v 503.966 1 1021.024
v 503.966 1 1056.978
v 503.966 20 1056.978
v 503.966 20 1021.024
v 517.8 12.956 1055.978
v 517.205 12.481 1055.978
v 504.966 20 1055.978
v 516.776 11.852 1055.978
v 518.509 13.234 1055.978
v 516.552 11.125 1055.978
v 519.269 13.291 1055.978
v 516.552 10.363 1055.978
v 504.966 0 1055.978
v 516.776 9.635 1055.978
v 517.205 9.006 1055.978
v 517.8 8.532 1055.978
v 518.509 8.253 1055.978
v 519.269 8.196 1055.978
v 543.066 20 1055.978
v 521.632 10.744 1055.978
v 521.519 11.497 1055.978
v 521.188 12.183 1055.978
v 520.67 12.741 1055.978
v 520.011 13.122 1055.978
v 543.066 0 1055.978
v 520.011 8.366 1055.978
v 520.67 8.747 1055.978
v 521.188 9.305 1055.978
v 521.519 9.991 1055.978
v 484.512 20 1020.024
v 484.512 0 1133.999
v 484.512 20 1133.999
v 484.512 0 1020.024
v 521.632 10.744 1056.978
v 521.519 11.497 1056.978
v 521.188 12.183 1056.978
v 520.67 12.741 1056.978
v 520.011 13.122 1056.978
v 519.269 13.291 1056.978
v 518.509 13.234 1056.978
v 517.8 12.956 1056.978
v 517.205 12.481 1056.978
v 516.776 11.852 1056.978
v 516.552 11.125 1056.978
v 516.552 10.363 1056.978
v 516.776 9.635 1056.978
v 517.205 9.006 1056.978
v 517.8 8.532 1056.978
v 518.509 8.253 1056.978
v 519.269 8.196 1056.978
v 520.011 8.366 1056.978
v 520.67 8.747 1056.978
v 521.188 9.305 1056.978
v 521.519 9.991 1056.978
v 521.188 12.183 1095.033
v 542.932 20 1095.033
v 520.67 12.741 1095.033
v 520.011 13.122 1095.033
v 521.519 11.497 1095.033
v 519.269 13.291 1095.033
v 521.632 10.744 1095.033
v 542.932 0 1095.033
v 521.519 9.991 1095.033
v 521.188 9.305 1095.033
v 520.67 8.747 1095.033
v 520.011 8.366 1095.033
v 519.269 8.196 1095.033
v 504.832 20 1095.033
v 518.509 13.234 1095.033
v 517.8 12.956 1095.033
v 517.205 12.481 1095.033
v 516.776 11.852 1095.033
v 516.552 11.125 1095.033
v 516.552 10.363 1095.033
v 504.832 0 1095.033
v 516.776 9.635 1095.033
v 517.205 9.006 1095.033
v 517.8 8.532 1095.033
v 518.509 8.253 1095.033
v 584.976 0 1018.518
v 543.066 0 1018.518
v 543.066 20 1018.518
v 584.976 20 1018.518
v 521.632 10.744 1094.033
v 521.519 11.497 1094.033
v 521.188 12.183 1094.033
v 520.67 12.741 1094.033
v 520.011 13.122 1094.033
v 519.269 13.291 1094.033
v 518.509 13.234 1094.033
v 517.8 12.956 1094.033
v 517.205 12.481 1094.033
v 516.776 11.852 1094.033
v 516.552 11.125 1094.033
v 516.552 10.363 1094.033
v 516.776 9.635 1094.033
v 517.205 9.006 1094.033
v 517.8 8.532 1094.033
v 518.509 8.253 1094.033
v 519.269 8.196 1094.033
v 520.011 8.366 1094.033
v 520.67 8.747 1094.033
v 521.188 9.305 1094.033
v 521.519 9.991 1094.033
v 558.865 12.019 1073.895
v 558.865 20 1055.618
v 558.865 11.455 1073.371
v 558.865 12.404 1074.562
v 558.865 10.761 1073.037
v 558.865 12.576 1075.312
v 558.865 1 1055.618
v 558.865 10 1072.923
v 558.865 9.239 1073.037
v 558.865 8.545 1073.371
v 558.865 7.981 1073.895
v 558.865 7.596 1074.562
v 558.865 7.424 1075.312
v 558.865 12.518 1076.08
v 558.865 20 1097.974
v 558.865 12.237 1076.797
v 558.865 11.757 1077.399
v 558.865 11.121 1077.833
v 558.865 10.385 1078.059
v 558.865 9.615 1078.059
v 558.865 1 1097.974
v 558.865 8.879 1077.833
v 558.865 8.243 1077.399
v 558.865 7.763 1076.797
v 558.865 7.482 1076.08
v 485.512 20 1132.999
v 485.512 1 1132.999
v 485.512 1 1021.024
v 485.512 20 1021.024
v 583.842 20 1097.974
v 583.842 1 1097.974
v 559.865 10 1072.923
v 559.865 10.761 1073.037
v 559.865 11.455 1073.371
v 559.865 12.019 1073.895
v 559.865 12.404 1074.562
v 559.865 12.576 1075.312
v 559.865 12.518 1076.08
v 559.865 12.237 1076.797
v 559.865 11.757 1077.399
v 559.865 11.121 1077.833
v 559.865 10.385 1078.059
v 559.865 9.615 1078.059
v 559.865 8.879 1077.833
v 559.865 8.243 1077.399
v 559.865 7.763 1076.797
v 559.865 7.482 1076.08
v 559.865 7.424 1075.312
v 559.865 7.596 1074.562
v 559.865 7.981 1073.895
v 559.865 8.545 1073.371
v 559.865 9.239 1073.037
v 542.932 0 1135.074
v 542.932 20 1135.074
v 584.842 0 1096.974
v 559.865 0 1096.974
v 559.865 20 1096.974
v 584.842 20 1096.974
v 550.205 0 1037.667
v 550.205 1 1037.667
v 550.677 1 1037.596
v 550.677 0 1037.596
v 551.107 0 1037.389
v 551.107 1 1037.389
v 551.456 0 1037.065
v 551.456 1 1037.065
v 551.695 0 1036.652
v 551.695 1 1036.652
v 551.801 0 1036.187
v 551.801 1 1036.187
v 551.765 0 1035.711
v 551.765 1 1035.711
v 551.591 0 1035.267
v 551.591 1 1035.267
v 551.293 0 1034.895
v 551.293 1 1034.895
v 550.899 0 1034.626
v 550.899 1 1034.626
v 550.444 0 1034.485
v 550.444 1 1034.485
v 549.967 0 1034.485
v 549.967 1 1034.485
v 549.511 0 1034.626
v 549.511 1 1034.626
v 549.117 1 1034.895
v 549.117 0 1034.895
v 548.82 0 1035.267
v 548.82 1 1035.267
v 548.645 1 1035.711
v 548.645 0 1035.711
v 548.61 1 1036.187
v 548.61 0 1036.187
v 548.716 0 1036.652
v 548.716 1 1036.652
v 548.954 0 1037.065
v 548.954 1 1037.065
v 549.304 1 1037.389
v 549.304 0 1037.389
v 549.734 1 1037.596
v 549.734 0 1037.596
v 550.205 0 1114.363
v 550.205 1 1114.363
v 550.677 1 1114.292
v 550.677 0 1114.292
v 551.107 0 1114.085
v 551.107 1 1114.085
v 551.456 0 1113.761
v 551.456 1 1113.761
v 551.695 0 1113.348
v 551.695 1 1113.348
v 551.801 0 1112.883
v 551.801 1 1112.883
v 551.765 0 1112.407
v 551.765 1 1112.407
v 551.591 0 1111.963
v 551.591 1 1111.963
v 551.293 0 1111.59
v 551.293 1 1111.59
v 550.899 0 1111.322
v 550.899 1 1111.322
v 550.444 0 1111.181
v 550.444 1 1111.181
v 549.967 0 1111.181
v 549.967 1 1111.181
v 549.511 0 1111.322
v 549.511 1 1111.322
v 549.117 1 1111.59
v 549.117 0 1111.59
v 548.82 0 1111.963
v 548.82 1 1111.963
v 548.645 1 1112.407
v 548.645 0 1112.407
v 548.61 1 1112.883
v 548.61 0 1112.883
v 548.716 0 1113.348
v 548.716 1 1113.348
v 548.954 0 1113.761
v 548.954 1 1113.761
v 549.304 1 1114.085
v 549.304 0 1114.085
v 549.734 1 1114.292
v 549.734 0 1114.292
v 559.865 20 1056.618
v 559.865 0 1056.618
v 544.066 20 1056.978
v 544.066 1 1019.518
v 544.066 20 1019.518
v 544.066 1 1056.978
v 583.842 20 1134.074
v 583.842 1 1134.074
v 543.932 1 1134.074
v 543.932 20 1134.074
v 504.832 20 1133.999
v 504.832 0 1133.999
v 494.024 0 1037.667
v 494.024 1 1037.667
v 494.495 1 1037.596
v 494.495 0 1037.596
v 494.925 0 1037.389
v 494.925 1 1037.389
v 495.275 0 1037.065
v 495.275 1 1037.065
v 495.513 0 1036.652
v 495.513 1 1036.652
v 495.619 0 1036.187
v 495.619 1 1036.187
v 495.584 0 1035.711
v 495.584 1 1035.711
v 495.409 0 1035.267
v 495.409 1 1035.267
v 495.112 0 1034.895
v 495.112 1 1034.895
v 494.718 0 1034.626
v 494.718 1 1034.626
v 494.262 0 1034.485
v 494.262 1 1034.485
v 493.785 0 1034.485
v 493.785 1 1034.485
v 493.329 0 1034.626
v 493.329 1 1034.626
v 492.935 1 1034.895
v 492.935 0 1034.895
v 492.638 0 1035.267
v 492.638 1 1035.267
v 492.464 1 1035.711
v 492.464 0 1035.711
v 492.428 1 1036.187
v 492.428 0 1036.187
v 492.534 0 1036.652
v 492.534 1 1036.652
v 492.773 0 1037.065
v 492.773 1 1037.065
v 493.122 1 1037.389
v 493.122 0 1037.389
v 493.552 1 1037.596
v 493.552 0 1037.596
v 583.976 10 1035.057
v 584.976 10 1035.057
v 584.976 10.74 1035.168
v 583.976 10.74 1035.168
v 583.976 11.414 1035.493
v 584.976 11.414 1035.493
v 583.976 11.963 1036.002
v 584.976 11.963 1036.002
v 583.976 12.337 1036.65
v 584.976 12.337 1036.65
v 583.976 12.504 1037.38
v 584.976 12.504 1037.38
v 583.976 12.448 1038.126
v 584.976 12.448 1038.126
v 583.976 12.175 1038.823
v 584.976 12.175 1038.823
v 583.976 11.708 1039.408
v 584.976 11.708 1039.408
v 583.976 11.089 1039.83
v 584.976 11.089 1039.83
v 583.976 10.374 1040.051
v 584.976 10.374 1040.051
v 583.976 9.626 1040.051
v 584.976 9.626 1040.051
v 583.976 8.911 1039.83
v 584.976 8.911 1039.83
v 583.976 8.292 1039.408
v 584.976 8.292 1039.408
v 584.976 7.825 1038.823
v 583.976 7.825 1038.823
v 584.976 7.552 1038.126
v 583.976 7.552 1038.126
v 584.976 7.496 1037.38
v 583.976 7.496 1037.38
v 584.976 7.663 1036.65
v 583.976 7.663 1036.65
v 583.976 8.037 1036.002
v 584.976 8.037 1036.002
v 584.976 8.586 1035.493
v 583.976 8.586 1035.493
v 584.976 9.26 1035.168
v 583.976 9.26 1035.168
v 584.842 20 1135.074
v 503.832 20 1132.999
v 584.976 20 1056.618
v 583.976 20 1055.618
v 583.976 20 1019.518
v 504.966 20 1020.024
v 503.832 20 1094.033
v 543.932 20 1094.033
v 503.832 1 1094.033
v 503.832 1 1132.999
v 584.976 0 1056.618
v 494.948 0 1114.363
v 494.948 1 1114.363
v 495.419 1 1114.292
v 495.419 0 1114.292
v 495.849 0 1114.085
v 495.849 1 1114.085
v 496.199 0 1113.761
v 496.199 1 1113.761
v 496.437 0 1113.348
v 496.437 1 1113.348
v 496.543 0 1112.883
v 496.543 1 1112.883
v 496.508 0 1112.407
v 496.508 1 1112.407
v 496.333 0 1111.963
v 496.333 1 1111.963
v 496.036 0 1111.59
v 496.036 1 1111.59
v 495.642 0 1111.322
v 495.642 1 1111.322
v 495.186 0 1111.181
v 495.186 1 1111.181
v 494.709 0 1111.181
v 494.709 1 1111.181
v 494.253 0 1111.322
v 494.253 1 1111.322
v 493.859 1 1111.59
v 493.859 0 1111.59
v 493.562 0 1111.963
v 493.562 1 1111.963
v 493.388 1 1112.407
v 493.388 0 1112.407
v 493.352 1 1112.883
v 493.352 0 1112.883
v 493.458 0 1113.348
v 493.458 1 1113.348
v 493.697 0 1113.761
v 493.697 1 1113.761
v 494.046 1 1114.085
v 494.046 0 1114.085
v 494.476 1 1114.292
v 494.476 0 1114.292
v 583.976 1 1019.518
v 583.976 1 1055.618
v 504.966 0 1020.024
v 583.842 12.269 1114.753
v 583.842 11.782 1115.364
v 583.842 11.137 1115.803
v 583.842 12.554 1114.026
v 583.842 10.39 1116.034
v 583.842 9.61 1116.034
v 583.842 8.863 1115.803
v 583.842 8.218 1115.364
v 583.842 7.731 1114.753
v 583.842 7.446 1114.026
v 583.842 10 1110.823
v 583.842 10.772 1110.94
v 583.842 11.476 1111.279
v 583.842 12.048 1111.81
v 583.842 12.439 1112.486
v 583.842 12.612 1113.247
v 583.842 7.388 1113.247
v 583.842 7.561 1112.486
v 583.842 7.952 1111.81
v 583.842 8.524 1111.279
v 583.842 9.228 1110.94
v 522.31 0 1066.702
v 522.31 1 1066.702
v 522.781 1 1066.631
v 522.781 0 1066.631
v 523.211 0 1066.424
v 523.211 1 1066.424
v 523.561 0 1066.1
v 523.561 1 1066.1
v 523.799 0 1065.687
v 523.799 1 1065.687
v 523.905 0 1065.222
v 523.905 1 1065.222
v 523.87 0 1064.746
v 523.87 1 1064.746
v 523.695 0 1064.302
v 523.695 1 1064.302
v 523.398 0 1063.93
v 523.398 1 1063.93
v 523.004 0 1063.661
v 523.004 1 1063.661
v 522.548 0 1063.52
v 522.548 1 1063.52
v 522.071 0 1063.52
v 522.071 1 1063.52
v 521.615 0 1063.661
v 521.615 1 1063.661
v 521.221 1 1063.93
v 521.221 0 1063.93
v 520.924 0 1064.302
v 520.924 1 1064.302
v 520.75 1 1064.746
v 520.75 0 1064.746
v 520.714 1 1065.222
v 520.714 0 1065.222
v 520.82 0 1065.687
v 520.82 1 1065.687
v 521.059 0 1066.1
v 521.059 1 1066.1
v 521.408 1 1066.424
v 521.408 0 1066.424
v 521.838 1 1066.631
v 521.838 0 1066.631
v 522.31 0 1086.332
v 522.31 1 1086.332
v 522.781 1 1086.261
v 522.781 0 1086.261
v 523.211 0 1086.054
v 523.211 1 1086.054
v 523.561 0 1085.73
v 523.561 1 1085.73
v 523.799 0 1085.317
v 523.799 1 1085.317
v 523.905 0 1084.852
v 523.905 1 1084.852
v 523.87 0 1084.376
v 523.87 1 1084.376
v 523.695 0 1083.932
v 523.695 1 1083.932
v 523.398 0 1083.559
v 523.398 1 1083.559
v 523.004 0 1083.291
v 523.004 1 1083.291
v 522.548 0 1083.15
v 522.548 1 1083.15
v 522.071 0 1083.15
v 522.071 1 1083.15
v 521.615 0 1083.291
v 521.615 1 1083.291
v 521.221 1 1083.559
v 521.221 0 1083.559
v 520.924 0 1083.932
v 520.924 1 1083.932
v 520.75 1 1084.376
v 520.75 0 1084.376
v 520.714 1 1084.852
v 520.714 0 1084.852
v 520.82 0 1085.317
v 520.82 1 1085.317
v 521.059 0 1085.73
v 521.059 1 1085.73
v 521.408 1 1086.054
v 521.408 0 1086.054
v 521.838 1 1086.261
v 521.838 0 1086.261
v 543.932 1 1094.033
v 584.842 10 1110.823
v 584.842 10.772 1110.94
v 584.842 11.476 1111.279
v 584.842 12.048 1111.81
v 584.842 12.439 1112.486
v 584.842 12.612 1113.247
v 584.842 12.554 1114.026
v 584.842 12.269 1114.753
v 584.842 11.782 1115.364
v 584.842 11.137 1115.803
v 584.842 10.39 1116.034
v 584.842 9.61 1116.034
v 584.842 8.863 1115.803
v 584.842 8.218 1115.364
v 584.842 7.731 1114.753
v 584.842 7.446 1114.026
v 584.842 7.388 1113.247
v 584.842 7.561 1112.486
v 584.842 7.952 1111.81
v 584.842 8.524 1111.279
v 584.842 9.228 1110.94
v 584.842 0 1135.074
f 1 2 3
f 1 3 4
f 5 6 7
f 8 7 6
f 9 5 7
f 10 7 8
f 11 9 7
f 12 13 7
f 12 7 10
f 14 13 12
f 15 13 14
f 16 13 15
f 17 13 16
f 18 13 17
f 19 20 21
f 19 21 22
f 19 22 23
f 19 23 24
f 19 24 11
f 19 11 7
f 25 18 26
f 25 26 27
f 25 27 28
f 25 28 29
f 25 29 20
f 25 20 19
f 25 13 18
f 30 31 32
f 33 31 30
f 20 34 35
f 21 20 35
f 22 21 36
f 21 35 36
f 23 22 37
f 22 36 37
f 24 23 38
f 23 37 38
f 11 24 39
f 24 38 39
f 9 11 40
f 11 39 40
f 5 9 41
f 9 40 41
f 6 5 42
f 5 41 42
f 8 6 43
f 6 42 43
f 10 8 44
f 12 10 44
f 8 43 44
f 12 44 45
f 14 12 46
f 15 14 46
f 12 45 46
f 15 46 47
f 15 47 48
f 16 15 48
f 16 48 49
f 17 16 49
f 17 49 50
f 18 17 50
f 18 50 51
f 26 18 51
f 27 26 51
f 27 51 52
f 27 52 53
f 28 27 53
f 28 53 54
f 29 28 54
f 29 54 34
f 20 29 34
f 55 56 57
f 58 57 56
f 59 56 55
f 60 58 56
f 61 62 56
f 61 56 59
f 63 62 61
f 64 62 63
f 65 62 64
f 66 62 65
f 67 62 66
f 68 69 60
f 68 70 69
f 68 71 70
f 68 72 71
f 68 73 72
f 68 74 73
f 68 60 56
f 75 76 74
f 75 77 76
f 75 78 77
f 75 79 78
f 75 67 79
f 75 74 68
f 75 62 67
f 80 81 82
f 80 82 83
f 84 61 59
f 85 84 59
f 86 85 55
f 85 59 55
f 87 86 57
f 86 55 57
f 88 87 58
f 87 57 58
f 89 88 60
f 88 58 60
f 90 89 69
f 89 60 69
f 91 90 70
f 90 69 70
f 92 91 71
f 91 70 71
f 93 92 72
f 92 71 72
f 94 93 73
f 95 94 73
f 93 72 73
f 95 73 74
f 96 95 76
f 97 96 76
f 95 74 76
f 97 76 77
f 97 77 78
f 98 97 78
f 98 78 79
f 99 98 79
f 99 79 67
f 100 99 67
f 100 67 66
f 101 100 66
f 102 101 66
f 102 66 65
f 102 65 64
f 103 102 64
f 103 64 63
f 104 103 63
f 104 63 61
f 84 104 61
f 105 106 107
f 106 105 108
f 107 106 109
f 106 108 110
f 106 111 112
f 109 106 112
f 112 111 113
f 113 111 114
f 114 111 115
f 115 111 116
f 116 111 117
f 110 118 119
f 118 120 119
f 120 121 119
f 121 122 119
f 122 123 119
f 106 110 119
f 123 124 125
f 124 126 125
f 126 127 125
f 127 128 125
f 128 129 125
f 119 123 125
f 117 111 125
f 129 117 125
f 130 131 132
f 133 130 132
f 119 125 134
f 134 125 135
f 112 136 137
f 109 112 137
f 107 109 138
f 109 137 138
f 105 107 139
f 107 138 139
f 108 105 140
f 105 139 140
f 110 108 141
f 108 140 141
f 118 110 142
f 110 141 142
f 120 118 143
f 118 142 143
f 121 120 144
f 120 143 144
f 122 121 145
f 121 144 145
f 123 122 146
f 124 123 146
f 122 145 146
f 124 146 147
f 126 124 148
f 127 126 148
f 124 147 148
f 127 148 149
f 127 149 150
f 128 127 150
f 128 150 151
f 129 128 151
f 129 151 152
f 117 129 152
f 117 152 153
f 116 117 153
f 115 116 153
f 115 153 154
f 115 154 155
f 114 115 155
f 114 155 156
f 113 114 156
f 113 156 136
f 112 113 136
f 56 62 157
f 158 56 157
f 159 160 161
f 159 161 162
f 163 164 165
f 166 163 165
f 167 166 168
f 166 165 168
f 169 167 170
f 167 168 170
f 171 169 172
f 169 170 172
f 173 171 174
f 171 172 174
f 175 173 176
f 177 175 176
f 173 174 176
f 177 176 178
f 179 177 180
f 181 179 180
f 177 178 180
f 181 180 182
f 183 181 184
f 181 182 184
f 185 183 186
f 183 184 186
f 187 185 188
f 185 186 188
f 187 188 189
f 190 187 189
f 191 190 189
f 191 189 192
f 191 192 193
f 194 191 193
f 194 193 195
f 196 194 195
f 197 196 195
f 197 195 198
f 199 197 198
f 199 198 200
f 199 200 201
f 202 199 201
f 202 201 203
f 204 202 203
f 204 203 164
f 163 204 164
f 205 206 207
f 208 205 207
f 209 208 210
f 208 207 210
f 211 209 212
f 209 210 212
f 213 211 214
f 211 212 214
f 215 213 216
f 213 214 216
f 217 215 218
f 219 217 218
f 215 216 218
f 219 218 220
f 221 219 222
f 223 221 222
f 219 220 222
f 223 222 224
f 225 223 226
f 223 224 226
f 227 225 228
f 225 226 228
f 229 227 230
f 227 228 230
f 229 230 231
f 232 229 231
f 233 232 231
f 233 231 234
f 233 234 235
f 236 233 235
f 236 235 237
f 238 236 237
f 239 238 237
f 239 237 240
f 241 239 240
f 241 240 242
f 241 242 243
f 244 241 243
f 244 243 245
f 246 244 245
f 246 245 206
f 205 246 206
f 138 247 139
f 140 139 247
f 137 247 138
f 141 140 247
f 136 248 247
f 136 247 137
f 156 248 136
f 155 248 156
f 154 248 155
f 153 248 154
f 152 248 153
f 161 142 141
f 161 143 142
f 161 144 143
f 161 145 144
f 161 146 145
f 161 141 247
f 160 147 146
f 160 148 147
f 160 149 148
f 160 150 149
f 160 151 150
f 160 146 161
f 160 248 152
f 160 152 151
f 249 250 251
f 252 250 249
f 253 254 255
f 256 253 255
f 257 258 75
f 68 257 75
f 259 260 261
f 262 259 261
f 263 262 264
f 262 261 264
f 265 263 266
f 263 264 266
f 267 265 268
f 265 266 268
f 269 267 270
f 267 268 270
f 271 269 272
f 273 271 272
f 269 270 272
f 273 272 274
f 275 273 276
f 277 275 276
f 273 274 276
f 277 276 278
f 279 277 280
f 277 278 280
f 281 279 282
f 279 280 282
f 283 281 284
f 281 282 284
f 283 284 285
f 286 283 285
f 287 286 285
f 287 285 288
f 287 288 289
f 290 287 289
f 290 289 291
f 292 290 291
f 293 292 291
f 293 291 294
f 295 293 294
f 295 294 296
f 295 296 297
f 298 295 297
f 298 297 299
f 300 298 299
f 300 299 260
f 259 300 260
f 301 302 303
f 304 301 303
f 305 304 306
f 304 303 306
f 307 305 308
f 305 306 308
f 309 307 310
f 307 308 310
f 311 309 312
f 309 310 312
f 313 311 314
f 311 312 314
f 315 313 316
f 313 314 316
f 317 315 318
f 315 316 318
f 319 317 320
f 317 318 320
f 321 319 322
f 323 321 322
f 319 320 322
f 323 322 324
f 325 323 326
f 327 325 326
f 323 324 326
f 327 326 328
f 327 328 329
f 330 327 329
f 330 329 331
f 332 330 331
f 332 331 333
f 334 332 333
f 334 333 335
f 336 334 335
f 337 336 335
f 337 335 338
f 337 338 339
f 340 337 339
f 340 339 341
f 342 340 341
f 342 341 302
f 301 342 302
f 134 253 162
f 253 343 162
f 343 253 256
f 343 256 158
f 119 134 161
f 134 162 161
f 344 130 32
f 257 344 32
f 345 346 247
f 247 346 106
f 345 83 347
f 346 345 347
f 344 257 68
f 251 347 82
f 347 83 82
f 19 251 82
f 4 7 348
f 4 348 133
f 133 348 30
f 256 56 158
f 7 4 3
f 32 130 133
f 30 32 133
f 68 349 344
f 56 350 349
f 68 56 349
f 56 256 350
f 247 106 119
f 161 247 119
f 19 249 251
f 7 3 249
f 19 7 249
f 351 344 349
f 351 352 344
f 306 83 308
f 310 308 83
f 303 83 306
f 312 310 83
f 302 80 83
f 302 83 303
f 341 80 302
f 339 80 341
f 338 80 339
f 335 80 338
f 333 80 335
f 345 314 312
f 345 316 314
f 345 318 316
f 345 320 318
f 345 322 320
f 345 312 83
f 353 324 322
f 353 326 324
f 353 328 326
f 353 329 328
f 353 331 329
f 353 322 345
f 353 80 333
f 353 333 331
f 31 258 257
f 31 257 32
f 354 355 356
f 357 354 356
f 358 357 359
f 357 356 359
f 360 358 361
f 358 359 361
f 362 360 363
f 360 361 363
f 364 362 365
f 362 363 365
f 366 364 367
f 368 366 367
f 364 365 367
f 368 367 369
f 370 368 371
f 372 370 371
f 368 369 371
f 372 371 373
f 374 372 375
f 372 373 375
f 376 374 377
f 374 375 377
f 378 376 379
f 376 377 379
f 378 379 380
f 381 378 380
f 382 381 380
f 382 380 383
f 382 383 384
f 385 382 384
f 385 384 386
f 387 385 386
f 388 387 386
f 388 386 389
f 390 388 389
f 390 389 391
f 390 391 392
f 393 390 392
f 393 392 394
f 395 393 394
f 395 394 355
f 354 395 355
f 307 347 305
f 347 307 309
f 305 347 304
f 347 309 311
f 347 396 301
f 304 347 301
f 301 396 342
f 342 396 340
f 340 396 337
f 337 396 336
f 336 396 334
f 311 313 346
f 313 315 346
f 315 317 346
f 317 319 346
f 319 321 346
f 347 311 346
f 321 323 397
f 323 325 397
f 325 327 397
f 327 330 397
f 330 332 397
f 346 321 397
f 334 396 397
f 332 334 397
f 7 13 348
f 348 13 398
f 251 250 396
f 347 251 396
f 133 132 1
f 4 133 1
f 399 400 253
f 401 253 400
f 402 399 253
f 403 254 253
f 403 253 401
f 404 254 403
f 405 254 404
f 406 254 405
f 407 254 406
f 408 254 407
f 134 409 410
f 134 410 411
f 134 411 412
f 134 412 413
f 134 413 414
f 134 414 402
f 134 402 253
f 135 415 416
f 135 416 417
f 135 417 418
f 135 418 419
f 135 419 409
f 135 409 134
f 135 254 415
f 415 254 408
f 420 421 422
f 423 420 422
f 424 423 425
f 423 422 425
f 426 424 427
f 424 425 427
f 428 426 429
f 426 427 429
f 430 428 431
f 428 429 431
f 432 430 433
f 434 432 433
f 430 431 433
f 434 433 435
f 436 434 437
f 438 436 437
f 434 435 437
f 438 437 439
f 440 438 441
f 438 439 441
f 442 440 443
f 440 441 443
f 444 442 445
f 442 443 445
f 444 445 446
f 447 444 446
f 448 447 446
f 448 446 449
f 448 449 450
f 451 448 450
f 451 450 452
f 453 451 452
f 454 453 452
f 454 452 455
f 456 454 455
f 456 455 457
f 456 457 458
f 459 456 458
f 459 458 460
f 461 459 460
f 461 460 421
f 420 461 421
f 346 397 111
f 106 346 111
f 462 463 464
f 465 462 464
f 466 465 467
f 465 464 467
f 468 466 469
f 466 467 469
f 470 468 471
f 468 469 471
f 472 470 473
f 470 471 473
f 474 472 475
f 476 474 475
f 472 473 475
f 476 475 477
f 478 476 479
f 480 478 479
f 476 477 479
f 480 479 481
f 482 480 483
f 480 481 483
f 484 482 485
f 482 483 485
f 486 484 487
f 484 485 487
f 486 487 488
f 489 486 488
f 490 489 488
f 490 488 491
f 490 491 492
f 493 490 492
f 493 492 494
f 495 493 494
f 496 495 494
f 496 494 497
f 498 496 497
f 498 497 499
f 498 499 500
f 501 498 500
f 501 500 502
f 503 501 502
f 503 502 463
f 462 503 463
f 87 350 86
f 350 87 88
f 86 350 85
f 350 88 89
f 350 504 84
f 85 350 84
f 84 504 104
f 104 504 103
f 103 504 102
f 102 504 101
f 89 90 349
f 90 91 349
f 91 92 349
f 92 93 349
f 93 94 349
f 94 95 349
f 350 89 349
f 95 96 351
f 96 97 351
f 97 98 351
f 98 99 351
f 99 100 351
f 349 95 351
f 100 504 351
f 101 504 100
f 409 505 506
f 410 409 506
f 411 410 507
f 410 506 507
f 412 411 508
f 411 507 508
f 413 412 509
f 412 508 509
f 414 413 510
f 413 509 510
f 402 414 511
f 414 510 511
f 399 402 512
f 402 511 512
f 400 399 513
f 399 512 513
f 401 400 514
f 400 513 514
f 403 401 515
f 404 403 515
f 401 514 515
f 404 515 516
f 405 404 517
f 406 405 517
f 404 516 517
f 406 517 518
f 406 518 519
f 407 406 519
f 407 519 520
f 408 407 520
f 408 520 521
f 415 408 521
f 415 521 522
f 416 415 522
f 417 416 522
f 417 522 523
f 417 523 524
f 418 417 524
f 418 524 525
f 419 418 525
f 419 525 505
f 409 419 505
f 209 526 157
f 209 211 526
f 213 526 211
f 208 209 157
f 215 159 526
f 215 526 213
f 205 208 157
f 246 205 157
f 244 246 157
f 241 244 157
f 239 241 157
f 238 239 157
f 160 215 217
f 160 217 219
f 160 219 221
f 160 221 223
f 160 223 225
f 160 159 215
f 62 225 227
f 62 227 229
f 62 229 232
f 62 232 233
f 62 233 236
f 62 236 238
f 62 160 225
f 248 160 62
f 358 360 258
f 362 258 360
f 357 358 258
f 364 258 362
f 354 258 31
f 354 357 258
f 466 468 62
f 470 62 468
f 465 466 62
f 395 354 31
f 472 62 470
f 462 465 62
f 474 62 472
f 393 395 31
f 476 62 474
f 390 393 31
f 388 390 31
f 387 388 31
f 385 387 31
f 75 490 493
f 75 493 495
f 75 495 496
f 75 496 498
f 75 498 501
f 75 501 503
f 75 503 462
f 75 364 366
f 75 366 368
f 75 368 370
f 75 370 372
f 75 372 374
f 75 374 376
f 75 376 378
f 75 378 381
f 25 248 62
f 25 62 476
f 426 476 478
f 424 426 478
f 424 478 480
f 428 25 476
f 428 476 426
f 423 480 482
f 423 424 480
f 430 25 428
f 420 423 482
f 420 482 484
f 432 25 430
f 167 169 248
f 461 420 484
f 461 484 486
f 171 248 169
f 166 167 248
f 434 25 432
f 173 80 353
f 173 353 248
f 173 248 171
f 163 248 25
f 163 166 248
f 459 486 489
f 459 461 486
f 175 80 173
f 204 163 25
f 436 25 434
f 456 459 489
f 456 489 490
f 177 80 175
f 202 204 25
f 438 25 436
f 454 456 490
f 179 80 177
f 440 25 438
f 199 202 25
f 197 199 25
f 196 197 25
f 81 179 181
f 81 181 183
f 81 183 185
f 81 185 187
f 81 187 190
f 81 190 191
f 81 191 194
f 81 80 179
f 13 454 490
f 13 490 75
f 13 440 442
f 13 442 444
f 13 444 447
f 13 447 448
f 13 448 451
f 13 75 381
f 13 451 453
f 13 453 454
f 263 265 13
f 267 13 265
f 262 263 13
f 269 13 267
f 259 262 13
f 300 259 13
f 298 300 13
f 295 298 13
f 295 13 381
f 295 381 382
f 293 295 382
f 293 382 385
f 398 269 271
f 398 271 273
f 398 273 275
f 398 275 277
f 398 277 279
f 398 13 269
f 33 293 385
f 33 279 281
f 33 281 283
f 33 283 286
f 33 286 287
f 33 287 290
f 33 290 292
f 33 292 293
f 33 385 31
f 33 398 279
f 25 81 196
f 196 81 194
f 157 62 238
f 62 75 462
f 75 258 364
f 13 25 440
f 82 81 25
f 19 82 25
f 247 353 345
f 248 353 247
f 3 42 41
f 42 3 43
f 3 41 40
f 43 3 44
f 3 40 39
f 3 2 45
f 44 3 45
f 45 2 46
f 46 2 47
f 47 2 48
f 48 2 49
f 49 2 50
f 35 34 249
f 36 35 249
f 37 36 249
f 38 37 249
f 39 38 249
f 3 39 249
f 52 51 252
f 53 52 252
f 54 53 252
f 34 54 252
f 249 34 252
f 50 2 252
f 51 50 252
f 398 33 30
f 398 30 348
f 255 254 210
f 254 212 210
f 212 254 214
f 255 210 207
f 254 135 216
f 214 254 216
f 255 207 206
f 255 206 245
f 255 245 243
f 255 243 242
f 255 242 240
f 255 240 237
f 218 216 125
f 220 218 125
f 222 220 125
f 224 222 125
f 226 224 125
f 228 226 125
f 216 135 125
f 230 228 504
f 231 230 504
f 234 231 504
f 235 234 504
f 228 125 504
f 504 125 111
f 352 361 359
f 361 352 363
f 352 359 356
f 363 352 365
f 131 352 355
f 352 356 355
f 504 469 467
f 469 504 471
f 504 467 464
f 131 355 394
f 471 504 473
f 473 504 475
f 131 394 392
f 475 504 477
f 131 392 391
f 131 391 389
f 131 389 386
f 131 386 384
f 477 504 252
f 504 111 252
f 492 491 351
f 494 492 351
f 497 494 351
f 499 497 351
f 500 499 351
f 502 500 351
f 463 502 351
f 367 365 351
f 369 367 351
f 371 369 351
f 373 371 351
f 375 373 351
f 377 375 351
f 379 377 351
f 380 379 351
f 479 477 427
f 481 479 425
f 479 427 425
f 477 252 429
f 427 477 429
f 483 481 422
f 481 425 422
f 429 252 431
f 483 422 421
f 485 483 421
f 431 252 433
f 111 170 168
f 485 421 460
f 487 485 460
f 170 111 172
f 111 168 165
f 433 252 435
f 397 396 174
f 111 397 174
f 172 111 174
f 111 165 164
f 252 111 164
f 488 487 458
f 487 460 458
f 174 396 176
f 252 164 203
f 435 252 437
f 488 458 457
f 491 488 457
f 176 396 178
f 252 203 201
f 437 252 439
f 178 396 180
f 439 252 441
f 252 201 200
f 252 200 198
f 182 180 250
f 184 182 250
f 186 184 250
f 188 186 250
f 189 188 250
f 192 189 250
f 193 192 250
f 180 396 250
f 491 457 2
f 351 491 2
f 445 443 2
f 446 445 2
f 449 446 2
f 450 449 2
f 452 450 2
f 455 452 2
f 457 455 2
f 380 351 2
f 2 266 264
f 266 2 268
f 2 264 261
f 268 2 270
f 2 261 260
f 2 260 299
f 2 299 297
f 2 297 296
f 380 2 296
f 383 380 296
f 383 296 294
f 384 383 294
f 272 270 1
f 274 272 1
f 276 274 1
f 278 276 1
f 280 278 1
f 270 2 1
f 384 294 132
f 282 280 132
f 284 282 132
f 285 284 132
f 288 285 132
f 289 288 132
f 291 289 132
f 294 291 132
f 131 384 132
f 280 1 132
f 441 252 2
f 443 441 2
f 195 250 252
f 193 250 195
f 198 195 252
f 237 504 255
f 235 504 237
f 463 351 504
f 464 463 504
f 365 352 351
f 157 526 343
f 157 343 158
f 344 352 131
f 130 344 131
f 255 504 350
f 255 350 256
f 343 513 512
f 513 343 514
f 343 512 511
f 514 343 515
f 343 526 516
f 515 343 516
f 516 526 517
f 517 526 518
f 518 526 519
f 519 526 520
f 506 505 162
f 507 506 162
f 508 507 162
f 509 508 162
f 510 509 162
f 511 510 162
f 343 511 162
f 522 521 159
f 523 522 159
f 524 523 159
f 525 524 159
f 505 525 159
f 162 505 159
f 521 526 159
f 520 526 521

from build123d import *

# Parameters (mm, degrees)
BOSS_EXTRUDE2_DEPTH = 20
SHELL1_T            = -1
SKETCH5_R           = 2.554490716
CUT_EXTRUDE1_DEPTH  = 40.64
SKETCH6_R           = 2.564818337
SKETCH6_R_2         = 2.573203383
SKETCH6_R_3         = 2.511002724
CUT_EXTRUDE3_DEPTH  = 10
SKETCH7_R           = 2.582908473
CUT_EXTRUDE4_DEPTH  = 10
SKETCH9_R           = 2.619720314
CUT_EXTRUDE6_DEPTH  = 10
SKETCH10_R          = 1.6
CUT_EXTRUDE7_DEPTH  = 10


with BuildPart() as part:
    # Sketch1 → Boss-Extrude2 (new body)
    with BuildSketch(Plane(origin=(0, 0, 0), x_dir=(1, 0, 0), z_dir=(0, 1, 0))):
        Polygon((543.066064215, -1022.739016237), (543.066064215, -1018.517703014), (584.976064215, -1018.517703014), (584.976064215, -1056.617703014), (559.865211068, -1056.617703014), (559.865211068, -1096.973737777), (584.842442734, -1096.973737777), (584.842442734, -1103.207715654), (584.842442734, -1135.073737777), (542.932442734, -1135.073737777), (542.932442734, -1128.271846788), (542.932442734, -1095.03316), (504.832442734, -1095.03316), (504.832442734, -1128.271846788), (504.832442734, -1133.999106761), (484.512442734, -1133.999106761), (484.512442734, -1020.023649765), (504.966064215, -1020.023649765), (504.966064215, -1022.739016237), (504.966064215, -1055.977703024), (543.066064215, -1055.977703024), align=None)
    extrude(amount=BOSS_EXTRUDE2_DEPTH)

    # Shell1
    shell1_openings = [part.faces().sort_by_distance(p)[0] for p in [
        (534.165694699, 20, 1076.58641914),
    ]]
    offset(amount=SHELL1_T, openings=shell1_openings, kind=Kind.INTERSECTION)

    # Sketch5 → Cut-Extrude1 (cut)
    with BuildSketch(Plane.XY.offset(1095.03316)):
        with Locations((519.077633691, 10.743789128)):
            Circle(SKETCH5_R)
    extrude(amount=-CUT_EXTRUDE1_DEPTH, mode=Mode.SUBTRACT)

    # Sketch6 → Cut-Extrude3 (cut)
    with BuildSketch(Plane(origin=(584.976064215, 0, 0), x_dir=(0, 0, -1), z_dir=(1, 0, 0))):
        with Locations(Location((-1113.44316001, 10, 0), (0, 0, 180))):
            Circle(SKETCH6_R)
        with Locations((-1075.505431512, 10)):
            Circle(SKETCH6_R_2)
        with Locations((-1037.567703014, 10)):
            Circle(SKETCH6_R_3)
    extrude(amount=-CUT_EXTRUDE3_DEPTH, mode=Mode.SUBTRACT)

    # Sketch7 → Cut-Extrude4 (cut)
    with BuildSketch(Plane(origin=(559.865211068, 0, 0), x_dir=(0, 0, -1), z_dir=(1, 0, 0))):
        with Locations((-1075.505431512, 10)):
            Circle(SKETCH7_R)
    extrude(amount=-CUT_EXTRUDE4_DEPTH, mode=Mode.SUBTRACT)

    # Sketch9 → Cut-Extrude6 (cut)
    with BuildSketch(Plane(origin=(584.842442734, 0, 0), x_dir=(0, 0, -1), z_dir=(1, 0, 0))):
        with Locations((-1113.44316001, 10)):
            Circle(SKETCH9_R)
    extrude(amount=-CUT_EXTRUDE6_DEPTH, mode=Mode.SUBTRACT)

    # Sketch10 → Cut-Extrude7 (cut)
    with BuildSketch(Plane(origin=(0, 1, 0), x_dir=(1, 0, 0), z_dir=(0, 1, 0))):
        with Locations(Location((494.947633691, -1112.763160005, 0), (0, 0, 270))):
            Circle(SKETCH10_R)
        with Locations(Location((550.205220573, -1112.763160005, 0), (0, 0, 270))):
            Circle(SKETCH10_R)
        with Locations(Location((522.30969217, -1084.732316133, 0), (0, 0, 270))):
            Circle(SKETCH10_R)
        with Locations(Location((522.30969217, -1065.102492134, 0), (0, 0, 270))):
            Circle(SKETCH10_R)
        with Locations(Location((550.205220573, -1036.067482908, 0), (0, 0, 270))):
            Circle(SKETCH10_R)
        with Locations(Location((494.023662931, -1036.067482908, 0), (0, 0, 270))):
            Circle(SKETCH10_R)
    extrude(amount=-CUT_EXTRUDE7_DEPTH, mode=Mode.SUBTRACT)


solid = part.part
